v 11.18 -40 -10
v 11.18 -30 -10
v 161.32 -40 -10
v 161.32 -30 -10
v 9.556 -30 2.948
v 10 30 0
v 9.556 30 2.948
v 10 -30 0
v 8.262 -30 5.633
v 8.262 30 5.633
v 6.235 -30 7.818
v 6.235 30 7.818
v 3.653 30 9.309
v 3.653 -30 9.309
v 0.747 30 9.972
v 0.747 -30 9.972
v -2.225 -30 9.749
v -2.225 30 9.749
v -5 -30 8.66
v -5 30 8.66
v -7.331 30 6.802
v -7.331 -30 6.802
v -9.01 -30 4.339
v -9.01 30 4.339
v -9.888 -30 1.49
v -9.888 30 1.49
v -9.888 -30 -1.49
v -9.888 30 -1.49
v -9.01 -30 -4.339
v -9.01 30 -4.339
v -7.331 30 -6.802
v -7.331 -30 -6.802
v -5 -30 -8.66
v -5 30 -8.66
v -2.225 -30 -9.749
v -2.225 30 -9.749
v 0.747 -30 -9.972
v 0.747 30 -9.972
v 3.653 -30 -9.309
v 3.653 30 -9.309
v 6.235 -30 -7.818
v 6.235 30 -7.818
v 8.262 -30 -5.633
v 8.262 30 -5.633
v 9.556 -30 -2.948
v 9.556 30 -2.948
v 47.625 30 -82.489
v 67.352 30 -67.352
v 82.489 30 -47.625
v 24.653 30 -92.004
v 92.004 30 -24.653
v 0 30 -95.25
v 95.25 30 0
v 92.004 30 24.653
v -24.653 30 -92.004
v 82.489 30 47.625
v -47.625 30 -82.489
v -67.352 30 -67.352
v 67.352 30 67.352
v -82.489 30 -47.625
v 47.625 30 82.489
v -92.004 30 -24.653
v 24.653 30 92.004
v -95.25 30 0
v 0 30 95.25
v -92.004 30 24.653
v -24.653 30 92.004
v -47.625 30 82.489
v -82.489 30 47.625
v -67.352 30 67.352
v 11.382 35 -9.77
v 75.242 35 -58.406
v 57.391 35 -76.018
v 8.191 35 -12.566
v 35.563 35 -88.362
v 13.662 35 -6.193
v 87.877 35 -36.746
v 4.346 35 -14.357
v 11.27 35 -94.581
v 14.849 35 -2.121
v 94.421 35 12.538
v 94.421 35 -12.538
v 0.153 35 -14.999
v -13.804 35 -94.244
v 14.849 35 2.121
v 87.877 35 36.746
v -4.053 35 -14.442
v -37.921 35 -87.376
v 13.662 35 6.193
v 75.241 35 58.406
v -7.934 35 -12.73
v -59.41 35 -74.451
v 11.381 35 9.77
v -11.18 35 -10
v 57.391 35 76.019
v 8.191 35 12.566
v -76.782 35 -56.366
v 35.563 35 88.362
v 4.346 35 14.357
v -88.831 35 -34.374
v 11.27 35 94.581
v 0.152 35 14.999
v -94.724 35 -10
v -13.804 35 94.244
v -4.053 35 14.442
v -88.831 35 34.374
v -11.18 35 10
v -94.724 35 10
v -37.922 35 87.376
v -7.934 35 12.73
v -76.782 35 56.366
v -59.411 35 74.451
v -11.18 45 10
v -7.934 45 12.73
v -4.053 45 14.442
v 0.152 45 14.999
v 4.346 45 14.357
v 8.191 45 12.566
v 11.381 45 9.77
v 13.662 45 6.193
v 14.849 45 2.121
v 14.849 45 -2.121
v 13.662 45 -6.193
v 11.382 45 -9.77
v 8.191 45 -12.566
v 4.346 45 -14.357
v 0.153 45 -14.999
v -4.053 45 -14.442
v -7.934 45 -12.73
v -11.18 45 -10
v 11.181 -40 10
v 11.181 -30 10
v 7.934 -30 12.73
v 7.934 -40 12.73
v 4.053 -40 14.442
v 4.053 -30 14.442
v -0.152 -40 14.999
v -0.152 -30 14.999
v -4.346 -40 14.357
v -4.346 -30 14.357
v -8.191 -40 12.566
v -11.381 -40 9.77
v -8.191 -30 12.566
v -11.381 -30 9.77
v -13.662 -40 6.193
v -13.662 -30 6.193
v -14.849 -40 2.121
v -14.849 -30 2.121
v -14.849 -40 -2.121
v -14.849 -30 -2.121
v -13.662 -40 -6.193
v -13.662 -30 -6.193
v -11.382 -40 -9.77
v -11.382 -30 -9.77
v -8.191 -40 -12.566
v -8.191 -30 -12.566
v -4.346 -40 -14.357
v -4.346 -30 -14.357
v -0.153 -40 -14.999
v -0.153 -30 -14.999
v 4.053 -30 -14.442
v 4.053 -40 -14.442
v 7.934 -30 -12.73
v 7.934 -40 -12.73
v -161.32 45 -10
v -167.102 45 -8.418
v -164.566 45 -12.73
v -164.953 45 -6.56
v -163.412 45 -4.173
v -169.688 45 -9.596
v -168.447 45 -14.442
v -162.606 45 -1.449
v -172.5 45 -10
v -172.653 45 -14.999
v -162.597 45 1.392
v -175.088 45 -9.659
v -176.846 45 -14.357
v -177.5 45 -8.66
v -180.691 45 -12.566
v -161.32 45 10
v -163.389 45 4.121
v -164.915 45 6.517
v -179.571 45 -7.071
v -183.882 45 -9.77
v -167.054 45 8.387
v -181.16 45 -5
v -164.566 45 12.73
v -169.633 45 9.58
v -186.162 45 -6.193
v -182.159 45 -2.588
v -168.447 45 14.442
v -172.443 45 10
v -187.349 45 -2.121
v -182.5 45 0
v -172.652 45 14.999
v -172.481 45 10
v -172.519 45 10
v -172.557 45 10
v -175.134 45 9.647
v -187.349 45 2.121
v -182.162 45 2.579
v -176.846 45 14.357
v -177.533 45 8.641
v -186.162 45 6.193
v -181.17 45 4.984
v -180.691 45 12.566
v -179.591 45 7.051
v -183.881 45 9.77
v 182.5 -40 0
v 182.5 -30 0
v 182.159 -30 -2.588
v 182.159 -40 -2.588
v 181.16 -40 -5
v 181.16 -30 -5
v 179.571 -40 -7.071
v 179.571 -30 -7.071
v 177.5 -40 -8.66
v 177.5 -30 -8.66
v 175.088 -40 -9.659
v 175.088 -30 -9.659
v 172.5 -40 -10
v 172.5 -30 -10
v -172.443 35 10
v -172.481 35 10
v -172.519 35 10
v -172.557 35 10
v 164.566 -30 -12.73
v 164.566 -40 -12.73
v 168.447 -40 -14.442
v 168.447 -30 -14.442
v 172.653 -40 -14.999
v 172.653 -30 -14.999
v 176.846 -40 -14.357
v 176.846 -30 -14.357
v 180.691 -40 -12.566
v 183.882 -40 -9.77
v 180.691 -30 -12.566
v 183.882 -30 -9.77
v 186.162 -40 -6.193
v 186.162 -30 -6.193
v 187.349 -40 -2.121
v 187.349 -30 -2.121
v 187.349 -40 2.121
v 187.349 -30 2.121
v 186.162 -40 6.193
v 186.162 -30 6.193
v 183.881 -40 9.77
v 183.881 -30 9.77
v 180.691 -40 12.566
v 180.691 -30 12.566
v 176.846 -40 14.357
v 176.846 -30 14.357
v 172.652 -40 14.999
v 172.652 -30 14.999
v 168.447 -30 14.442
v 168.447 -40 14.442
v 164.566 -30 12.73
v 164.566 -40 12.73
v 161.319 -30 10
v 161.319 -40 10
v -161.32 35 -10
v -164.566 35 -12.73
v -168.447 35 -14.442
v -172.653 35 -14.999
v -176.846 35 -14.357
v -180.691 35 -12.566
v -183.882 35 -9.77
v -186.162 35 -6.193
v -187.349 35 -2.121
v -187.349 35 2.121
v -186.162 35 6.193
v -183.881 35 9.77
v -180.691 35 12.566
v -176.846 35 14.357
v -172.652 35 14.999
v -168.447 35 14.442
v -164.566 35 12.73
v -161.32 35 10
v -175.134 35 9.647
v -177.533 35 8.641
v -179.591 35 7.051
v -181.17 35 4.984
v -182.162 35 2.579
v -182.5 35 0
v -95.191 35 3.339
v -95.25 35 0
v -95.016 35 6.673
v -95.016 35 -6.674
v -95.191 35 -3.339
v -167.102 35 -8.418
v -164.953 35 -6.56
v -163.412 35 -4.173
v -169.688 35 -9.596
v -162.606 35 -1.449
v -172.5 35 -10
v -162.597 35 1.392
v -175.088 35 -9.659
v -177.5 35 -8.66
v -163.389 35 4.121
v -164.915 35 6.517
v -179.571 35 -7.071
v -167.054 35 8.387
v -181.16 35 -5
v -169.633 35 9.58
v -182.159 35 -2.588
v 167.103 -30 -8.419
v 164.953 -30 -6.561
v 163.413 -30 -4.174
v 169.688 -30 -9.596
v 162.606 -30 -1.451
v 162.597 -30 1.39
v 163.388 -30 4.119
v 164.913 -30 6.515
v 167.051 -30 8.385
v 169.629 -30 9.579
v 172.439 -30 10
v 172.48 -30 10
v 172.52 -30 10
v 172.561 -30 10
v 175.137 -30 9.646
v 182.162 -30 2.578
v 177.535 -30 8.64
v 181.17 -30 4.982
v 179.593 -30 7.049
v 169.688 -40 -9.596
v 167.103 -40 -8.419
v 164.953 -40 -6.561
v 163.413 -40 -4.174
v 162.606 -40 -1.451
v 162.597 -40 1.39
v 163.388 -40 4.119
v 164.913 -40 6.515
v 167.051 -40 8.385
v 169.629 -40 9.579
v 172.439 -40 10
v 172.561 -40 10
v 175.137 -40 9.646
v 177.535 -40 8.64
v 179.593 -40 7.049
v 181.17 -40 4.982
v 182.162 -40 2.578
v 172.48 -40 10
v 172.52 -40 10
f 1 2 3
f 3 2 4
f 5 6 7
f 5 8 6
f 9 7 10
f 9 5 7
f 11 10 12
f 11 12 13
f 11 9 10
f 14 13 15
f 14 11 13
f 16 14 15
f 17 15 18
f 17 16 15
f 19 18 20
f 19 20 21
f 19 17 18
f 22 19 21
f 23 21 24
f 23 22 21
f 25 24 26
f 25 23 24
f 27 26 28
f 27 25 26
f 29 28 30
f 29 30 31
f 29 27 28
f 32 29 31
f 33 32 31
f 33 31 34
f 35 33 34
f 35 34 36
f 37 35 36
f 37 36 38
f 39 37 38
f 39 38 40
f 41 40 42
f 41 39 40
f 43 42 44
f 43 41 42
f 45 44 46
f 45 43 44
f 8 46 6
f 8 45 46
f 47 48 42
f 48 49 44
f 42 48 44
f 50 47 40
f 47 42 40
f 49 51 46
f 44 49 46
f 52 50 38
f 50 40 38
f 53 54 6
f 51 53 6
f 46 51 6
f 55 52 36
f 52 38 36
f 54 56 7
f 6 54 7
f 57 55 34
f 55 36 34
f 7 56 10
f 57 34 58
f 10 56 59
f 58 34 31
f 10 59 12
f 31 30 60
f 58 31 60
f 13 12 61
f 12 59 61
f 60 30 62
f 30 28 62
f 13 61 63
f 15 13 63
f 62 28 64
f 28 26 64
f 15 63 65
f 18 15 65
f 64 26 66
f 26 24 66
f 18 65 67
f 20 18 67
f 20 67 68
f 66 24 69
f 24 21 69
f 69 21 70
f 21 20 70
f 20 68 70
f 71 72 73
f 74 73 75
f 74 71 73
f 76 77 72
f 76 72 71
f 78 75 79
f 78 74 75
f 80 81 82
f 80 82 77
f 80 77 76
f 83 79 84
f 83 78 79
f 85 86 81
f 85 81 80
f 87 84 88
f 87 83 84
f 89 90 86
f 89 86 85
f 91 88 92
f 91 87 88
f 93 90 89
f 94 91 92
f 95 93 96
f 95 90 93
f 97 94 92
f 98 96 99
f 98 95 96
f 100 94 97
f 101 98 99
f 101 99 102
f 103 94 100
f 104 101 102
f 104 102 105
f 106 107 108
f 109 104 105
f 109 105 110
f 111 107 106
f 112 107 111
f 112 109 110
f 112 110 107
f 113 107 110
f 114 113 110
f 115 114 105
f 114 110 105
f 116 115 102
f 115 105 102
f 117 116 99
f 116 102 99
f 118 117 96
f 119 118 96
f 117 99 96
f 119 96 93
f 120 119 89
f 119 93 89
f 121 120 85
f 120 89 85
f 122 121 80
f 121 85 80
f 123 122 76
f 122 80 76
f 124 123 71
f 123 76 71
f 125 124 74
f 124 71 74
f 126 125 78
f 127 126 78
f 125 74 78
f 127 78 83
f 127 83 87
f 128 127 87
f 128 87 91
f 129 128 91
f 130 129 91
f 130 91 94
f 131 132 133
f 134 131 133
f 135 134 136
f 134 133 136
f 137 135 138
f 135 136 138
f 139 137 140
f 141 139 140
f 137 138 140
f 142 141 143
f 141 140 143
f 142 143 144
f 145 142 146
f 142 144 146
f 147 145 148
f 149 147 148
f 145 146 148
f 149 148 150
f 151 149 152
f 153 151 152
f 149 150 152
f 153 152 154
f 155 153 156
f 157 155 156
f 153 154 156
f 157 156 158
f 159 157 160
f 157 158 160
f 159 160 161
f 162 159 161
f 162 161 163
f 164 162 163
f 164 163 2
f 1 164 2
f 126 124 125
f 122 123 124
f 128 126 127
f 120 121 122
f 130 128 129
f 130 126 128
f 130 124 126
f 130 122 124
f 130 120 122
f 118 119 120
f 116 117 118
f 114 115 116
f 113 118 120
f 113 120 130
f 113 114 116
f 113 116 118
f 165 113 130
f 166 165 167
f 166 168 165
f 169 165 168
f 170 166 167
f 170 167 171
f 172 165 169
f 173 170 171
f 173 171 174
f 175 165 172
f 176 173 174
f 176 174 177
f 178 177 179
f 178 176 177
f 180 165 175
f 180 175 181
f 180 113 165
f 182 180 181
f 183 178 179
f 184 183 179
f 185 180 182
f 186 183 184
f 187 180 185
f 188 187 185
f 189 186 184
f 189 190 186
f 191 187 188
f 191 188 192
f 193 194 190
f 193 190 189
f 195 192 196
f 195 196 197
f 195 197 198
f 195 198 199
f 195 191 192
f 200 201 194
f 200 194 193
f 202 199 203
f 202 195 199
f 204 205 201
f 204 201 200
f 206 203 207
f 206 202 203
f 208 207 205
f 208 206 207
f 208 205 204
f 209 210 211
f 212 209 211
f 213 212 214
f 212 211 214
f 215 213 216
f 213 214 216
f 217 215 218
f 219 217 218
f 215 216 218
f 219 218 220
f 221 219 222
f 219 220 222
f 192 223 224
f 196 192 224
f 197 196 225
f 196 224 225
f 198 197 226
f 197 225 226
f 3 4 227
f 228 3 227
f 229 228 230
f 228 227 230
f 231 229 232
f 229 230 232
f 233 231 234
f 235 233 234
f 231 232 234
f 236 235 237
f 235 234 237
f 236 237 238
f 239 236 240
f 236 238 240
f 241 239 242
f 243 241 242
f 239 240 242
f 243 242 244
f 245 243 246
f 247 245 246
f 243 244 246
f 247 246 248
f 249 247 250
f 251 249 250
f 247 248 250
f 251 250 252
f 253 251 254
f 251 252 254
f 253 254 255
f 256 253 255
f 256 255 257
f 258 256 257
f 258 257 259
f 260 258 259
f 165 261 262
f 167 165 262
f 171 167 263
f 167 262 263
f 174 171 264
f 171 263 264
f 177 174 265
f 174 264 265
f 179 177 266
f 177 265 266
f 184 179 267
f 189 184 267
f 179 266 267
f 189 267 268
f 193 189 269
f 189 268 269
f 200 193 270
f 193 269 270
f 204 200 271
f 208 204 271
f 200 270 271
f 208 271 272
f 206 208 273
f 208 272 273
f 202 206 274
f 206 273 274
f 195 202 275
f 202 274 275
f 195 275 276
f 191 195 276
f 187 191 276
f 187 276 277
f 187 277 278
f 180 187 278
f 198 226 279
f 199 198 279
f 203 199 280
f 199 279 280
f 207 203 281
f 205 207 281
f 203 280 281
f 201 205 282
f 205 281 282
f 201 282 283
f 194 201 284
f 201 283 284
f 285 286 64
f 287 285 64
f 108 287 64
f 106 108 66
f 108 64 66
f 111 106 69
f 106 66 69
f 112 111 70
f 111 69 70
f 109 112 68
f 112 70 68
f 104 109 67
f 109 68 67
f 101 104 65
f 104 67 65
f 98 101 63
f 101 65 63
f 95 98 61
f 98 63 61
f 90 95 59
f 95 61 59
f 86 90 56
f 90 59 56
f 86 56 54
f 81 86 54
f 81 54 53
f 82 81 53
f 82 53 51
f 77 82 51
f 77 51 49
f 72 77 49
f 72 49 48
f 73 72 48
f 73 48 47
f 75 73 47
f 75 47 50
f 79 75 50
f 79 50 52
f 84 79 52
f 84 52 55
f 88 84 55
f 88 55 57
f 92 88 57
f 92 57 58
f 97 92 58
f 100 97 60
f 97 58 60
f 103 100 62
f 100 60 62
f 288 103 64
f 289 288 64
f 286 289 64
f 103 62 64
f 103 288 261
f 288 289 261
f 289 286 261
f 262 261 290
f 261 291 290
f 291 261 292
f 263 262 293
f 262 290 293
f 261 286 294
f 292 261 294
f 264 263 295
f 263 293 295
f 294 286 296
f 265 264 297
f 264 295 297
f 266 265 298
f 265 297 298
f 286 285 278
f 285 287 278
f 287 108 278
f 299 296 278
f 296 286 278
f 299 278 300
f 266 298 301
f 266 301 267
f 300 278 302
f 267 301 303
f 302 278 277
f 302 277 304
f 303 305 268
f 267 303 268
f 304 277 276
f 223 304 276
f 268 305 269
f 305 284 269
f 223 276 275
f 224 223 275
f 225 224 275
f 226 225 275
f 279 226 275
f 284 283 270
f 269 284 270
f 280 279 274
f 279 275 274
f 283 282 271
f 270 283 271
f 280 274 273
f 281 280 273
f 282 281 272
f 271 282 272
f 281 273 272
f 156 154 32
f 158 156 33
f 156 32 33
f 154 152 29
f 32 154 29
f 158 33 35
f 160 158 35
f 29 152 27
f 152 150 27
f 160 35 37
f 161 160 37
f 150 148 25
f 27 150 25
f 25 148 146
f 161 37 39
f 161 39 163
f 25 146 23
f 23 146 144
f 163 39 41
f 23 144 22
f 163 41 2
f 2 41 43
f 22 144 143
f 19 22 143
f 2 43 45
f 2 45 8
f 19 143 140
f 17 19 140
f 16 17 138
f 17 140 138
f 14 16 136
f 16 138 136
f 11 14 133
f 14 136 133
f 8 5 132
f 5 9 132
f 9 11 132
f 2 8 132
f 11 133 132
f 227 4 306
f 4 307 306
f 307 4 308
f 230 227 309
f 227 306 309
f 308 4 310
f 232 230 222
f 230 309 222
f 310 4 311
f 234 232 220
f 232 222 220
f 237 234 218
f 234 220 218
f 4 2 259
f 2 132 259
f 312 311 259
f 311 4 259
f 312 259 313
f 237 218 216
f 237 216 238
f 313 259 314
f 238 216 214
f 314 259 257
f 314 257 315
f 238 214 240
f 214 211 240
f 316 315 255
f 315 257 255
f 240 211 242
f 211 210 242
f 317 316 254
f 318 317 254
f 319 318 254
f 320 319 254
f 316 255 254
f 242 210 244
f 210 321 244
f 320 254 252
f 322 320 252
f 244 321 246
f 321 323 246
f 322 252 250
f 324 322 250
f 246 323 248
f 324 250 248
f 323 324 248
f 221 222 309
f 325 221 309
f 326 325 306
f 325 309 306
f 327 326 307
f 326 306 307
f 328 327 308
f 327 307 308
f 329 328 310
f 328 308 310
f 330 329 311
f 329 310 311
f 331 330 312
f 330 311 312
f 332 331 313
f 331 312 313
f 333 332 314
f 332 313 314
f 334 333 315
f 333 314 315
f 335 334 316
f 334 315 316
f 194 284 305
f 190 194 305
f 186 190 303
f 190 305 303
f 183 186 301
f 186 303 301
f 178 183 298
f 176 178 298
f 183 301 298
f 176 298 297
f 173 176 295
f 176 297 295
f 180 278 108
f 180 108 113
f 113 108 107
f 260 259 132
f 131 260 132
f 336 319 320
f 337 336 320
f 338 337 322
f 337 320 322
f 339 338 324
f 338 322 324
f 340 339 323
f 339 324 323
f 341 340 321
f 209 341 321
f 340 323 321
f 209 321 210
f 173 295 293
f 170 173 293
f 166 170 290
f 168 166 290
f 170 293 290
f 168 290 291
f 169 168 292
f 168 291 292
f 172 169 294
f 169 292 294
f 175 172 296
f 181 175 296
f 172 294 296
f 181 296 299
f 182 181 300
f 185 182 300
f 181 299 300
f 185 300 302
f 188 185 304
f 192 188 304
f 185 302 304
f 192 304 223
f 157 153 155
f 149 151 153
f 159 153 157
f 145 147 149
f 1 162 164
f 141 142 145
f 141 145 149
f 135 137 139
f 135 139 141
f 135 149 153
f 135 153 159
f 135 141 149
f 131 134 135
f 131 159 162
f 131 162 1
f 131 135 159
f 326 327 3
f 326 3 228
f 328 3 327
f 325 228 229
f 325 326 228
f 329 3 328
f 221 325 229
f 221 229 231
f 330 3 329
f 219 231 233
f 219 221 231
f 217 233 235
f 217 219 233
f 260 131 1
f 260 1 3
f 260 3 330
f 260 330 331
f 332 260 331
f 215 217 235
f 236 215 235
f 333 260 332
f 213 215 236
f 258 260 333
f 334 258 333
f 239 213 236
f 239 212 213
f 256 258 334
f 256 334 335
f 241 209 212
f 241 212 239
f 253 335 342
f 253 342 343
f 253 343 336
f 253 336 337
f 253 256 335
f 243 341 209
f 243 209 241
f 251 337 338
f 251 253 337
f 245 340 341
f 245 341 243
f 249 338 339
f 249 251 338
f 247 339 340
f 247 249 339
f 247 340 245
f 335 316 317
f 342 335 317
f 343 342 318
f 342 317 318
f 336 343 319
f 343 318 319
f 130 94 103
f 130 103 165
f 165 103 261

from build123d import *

# Parameters (mm, degrees)
F0_R     = 10
F1_DEPTH = 30
F3_DEPTH = 10
F4_R     = 95.25
F5_DEPTH = 5
F7_DEPTH = 10


with BuildPart() as f1:
    # F0 (on Front) → F1 (new body, symmetric)
    with BuildSketch(Plane.XZ):
        Circle(F0_R)
    extrude(amount=F1_DEPTH, both=True)

    # F2 (on face) → F3 (join)
    with BuildSketch(Plane.XZ.offset(30)):
        with BuildLine():
            ThreePointArc((11.180508, 9.999812), (-15, 0.000126), (11.18034, -10))
            Line((11.18034, -10), (161.31966, -10))
            ThreePointArc((161.31966, -10), (187.5, 0.000126), (161.319492, 9.999812))
            Line((161.319492, 9.999812), (11.180508, 9.999812))
        make_face()
        with BuildLine():
            ThreePointArc((172.561293, 9.999812), (179.592705, 7.049364), (182.5, 0))
            ThreePointArc((182.5, 0), (179.571068, -7.071068), (172.5, -10))
            ThreePointArc((172.5, -10), (162.500047, -0.030647), (172.438707, 9.999812))
            ThreePointArc((172.438707, 9.999812), (172.5, 10), (172.561293, 9.999812))
        make_face(mode=Mode.SUBTRACT)
    extrude(amount=F3_DEPTH)

    # F4 (on face) → F5 (join)
    with BuildSketch(Plane(origin=(0, 30, 0), x_dir=(-1, 0, 0), z_dir=(0, 1, 0))):
        Circle(F4_R)
    extrude(amount=F5_DEPTH)

    # F6 (on face) → F7 (join)
    with BuildSketch(Plane(origin=(0, 35, 0), x_dir=(-1, 0, 0), z_dir=(0, 1, 0))):
        with BuildLine():
            Line((161.319515, 9.999837), (11.180485, 9.999837))
            ThreePointArc((11.180485, 9.999837), (-15, 0.000109), (11.18034, -10))
            Line((11.18034, -10), (161.31966, -10))
            ThreePointArc((161.31966, -10), (187.5, 0.000109), (161.319515, 9.999837))
        make_face()
        with BuildLine():
            ThreePointArc((172.557026, 9.999837), (179.591201, 7.050877), (182.5, 0))
            ThreePointArc((182.5, 0), (179.571068, -7.071068), (172.5, -10))
            ThreePointArc((172.5, -10), (162.500041, -0.028513), (172.442974, 9.999837))
            ThreePointArc((172.442974, 9.999837), (172.5, 10), (172.557026, 9.999837))
        make_face(mode=Mode.SUBTRACT)
    extrude(amount=F7_DEPTH)


solid = f1.part
